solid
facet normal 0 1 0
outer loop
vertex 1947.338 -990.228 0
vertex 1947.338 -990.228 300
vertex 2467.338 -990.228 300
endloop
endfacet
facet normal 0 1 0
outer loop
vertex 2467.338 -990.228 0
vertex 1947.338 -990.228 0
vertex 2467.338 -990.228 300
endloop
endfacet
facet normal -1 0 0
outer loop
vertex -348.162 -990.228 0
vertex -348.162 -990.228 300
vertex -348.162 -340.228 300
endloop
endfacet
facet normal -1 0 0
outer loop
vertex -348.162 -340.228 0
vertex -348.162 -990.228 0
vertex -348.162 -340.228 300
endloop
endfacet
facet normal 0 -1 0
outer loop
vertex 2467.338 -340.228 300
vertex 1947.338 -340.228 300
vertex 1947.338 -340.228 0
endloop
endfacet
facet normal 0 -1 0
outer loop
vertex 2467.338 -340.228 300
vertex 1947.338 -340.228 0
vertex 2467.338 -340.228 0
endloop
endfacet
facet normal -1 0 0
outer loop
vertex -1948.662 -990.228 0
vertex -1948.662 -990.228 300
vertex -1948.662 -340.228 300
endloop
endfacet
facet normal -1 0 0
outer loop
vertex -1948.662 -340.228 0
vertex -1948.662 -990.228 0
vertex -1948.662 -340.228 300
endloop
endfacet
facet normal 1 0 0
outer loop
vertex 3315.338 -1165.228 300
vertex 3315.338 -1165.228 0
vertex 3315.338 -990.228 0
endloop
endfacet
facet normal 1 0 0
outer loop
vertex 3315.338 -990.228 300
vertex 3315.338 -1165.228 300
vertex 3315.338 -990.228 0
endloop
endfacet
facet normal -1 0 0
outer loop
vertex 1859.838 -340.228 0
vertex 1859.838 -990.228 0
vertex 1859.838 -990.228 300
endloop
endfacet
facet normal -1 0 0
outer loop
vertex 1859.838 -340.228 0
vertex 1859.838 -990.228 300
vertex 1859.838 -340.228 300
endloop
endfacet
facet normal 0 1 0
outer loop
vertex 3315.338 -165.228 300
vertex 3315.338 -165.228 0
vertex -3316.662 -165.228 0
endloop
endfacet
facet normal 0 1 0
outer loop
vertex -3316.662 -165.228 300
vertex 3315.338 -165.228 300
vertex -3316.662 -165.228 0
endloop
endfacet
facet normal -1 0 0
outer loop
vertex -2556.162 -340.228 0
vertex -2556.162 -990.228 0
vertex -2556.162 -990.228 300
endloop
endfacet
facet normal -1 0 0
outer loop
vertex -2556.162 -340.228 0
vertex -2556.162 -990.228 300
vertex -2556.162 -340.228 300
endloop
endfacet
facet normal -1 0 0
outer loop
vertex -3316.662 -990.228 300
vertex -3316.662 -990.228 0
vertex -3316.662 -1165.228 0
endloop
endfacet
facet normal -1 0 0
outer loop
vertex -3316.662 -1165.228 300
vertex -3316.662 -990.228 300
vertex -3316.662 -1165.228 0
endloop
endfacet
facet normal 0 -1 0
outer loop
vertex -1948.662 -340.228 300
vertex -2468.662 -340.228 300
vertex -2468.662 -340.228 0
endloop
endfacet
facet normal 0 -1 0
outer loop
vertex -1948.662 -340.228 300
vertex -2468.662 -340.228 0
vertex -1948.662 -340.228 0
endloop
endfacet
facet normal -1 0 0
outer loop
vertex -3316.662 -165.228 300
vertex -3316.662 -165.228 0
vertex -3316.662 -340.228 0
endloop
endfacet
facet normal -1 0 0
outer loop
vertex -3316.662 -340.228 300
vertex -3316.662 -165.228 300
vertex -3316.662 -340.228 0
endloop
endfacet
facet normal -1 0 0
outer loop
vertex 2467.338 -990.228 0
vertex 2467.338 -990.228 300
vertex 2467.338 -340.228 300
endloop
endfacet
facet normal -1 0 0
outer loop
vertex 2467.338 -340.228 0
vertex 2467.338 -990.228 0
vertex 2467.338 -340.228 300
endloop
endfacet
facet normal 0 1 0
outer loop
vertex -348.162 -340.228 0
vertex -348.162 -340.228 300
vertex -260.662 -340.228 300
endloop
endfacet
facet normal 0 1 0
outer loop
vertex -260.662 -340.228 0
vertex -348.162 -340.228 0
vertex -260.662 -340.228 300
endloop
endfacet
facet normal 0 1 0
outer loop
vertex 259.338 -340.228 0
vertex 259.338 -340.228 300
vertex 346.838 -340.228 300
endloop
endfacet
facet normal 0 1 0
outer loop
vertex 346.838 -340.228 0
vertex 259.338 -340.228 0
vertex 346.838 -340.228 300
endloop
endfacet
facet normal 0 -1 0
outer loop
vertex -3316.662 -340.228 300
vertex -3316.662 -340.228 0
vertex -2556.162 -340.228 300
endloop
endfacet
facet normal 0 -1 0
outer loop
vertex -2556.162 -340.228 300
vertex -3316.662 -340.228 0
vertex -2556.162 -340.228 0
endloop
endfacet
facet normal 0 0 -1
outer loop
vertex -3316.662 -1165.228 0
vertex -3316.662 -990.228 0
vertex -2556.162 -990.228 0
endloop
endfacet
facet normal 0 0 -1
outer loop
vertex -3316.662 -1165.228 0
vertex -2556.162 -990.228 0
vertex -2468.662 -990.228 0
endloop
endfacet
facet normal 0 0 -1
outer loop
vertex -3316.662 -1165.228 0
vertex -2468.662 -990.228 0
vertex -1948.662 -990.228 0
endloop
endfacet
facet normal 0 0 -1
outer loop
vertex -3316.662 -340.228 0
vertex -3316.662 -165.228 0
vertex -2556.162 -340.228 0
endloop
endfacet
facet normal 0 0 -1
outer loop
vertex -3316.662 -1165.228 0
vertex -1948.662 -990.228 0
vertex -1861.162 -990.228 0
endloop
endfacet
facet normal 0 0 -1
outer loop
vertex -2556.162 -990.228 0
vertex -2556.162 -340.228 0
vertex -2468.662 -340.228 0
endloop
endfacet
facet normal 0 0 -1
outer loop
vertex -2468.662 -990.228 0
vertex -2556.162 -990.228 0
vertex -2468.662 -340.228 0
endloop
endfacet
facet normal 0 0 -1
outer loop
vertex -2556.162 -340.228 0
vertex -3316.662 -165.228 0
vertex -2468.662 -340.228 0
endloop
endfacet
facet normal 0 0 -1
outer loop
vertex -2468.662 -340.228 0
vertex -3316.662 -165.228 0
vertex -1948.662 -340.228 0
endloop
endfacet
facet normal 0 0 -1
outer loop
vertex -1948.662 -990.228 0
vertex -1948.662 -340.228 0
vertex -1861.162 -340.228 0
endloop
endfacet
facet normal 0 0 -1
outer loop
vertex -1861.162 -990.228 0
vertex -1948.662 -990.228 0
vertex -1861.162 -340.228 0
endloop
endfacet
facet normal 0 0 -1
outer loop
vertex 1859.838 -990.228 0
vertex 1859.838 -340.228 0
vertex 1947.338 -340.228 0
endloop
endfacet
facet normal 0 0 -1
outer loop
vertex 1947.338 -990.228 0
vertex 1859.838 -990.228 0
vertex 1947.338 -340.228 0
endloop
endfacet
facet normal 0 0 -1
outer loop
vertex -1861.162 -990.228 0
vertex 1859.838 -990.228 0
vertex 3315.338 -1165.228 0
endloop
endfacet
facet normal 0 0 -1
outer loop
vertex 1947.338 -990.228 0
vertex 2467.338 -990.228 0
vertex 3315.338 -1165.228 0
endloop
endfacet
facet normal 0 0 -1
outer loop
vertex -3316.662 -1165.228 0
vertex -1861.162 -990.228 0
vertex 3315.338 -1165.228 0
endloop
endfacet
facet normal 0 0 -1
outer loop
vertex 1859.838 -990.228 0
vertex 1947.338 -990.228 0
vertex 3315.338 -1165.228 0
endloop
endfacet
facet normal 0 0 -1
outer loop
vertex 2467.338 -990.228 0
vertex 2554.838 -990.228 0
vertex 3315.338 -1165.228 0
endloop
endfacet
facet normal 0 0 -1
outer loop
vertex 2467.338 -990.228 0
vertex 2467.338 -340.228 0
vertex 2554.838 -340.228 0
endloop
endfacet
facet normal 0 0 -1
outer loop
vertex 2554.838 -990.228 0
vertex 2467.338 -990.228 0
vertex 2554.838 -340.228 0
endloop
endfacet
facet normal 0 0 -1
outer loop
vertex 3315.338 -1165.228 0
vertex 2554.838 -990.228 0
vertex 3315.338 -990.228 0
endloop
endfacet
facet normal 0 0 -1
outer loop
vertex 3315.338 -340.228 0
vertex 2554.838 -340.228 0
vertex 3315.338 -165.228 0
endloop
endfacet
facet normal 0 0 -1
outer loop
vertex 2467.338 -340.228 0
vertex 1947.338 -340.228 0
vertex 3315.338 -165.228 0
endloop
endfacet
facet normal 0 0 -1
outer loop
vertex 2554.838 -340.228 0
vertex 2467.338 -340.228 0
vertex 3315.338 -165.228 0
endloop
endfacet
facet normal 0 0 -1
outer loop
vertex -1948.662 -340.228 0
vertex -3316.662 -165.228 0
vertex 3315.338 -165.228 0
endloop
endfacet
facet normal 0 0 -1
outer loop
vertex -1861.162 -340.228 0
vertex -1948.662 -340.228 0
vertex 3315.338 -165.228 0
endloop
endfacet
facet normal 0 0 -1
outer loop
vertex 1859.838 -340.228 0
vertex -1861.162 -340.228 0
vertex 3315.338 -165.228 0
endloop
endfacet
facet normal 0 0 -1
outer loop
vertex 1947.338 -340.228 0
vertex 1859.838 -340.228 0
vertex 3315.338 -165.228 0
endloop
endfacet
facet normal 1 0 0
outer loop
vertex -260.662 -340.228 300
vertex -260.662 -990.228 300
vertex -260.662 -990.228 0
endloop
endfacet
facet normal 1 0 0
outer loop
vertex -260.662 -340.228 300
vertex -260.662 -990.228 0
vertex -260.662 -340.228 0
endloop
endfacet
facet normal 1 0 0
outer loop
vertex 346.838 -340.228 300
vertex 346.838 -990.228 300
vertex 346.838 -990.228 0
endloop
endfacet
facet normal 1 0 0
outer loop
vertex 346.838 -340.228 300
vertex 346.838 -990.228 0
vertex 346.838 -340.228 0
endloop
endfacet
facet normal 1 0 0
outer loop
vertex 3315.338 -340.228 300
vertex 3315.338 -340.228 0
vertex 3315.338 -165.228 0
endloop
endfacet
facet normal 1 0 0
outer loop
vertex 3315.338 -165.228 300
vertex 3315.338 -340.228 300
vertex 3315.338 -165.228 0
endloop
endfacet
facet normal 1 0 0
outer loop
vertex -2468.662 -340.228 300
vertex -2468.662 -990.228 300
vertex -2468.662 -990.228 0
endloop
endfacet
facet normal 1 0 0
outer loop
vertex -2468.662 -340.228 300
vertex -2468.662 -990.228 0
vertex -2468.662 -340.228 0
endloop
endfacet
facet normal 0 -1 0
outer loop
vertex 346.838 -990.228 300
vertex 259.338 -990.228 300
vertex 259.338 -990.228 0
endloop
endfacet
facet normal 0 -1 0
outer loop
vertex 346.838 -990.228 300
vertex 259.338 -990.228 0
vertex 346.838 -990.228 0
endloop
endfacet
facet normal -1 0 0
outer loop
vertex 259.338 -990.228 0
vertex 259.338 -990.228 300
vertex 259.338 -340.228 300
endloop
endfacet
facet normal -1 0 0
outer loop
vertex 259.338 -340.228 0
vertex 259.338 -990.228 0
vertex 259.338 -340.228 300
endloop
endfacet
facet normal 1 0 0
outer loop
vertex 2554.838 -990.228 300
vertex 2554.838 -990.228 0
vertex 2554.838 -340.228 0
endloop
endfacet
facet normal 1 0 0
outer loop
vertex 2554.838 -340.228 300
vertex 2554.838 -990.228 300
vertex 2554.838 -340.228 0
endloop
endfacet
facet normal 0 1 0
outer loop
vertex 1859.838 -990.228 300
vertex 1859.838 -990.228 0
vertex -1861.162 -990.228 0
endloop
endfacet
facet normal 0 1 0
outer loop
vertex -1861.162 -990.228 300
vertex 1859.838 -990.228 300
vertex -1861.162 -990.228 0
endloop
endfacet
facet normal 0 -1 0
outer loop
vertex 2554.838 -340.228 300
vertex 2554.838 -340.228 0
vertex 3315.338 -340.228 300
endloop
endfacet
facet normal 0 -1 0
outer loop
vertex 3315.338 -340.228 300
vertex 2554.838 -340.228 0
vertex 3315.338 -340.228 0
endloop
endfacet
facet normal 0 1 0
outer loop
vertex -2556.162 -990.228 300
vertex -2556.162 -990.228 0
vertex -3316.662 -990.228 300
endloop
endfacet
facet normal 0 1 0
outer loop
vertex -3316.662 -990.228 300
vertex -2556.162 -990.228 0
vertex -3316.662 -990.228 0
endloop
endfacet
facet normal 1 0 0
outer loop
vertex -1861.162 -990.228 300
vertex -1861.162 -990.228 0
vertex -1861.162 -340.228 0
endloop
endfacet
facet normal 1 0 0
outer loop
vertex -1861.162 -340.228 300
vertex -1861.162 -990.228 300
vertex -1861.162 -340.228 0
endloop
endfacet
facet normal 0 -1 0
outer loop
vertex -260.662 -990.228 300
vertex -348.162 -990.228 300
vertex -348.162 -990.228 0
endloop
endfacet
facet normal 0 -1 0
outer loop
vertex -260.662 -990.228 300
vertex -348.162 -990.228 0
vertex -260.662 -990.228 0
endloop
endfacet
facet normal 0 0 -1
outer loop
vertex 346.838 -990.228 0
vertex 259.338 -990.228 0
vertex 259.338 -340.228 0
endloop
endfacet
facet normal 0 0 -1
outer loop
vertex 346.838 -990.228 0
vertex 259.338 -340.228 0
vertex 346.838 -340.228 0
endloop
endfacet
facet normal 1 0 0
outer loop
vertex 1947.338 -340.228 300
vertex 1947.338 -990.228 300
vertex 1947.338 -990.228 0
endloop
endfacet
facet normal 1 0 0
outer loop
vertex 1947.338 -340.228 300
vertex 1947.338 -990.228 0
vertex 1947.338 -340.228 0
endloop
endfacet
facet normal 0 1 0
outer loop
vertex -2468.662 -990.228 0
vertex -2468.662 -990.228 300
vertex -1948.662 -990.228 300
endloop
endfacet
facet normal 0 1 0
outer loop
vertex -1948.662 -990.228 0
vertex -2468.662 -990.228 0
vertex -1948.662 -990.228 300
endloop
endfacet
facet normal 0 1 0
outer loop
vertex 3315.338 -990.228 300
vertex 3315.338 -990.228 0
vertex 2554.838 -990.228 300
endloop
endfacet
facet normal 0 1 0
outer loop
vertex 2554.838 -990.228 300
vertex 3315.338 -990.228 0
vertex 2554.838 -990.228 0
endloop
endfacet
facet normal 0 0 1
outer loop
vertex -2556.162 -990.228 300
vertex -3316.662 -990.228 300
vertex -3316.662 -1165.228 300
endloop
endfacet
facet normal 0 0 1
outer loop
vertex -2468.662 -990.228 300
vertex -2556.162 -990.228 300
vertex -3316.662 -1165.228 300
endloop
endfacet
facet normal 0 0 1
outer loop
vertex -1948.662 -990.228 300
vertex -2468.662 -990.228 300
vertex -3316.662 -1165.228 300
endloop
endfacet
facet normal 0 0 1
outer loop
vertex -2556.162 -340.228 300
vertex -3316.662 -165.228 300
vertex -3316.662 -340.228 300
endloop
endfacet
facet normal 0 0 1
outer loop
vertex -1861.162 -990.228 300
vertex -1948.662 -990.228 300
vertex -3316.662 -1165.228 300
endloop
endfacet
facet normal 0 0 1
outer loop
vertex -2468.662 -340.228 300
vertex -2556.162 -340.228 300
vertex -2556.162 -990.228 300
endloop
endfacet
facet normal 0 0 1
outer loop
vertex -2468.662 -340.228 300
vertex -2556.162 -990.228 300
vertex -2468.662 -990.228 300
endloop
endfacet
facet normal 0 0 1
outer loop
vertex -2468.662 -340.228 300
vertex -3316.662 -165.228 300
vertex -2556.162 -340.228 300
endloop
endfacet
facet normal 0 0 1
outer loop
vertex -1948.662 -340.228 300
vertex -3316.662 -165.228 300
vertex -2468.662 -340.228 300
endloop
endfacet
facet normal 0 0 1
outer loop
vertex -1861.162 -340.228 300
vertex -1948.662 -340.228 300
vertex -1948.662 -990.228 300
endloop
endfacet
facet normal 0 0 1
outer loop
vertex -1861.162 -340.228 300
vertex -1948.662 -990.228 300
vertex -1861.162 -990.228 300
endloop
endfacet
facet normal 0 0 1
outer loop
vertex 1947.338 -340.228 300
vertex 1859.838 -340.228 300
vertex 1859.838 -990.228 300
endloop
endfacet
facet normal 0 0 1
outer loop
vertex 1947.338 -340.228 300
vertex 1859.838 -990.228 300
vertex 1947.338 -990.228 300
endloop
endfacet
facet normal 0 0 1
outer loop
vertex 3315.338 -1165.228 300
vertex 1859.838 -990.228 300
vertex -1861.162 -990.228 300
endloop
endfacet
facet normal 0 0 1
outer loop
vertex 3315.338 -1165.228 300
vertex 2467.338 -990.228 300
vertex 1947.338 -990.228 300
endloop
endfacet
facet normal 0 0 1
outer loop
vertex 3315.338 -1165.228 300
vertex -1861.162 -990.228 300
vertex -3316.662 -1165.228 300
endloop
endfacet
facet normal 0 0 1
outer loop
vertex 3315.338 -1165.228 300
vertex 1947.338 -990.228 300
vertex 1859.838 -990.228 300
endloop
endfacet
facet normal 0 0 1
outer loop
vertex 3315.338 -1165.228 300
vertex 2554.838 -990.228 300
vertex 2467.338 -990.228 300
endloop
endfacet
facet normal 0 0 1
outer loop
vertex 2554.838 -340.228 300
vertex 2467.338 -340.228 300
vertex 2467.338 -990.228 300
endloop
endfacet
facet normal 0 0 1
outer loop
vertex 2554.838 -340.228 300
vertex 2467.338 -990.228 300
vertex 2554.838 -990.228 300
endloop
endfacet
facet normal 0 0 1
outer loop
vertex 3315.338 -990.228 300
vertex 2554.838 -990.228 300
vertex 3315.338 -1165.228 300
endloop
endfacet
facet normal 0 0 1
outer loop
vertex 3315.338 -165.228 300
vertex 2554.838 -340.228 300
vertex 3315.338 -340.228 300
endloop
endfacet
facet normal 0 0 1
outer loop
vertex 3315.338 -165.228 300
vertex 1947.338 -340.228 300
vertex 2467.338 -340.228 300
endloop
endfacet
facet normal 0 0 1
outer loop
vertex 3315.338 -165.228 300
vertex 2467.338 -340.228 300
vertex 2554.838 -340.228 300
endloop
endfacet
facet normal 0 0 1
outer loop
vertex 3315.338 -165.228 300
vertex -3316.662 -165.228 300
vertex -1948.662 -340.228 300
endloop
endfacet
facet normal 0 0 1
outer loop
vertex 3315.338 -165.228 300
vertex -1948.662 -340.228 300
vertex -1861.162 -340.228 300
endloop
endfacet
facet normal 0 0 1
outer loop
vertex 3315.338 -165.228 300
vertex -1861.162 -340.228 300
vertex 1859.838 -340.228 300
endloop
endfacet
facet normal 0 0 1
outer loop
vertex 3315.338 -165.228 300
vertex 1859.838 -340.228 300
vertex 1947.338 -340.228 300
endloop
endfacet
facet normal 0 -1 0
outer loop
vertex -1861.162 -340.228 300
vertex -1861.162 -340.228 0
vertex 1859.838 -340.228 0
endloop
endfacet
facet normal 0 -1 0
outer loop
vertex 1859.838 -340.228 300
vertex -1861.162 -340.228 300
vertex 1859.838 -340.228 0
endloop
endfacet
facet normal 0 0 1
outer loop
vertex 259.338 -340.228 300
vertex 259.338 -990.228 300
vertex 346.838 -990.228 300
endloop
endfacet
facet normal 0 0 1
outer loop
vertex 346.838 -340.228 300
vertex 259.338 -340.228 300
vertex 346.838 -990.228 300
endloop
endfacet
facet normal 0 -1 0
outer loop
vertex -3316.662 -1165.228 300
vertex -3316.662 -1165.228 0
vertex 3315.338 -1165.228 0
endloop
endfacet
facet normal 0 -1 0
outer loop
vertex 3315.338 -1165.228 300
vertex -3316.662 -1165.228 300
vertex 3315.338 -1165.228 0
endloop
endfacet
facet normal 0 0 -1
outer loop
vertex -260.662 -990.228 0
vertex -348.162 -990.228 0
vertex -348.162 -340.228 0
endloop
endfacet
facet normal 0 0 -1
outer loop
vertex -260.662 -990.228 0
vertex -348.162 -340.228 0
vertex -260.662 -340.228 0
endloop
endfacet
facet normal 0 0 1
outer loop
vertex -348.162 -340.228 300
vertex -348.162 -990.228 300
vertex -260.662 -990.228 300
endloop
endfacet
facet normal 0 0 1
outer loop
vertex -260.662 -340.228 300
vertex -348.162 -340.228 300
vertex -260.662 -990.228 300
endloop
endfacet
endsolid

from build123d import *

# Parameters (mm, degrees)
F0_W     = 695
F0_H     = 650
F1_DEPTH = 300
F2_W     = 520
F2_H     = 650
F3_DEPTH = 300.001
F4_W     = 695
F4_H     = 650
F5_DEPTH = 300
F6_W     = 520
F6_H     = 650
F7_DEPTH = 300.001


with BuildPart() as f1:
    # F0 (on Top) → F1 (new body)
    with BuildSketch(Plane.XY):
        Polygon((-2556.161768, -990.227569), (-3316.661768, -990.227569), (-3316.661768, -1165.227569), (3315.338232, -1165.227569), (3315.338232, -990.227569), (2554.838232, -990.227569), (1859.838232, -990.227569), (346.838232, -990.227569), (-348.161768, -990.227569), (-1861.161768, -990.227569), align=None)
        with Locations((-2208.661768, -665.227569)):
            Rectangle(F0_W, F0_H)
        Polygon((-3316.661768, -340.227569), (-2556.161768, -340.227569), (-1861.161768, -340.227569), (-348.161768, -340.227569), (346.838232, -340.227569), (1859.838232, -340.227569), (2554.838232, -340.227569), (3315.338232, -340.227569), (3315.338232, -165.227569), (-3316.661768, -165.227569), align=None)
        with Locations((2207.338232, -665.227569)):
            Rectangle(F0_W, F0_H)
    extrude(amount=F1_DEPTH)

    # F2 (on face) → F3 (cut, through all)
    with BuildSketch(Plane.XY.offset(300)):
        with Locations((-2208.661768, -665.227569)):
            Rectangle(F2_W, F2_H)
        with Locations((2207.338232, -665.227569)):
            Rectangle(F2_W, F2_H)
    extrude(amount=-F3_DEPTH, mode=Mode.SUBTRACT)


with BuildPart() as f5:
    # F4 (on face) → F5 (new body)
    with BuildSketch(Plane.XY.offset(300)):
        with Locations((-0.661768, -665.227569)):
            Rectangle(F4_W, F4_H)
    extrude(amount=-F5_DEPTH)

    # F6 (on face) → F7 (cut, through all)
    with BuildSketch(Plane.XY.offset(300)):
        with Locations((-0.661768, -665.227569)):
            Rectangle(F6_W, F6_H)
    extrude(amount=-F7_DEPTH, mode=Mode.SUBTRACT)


solid = Compound([f1.part, f5.part])
